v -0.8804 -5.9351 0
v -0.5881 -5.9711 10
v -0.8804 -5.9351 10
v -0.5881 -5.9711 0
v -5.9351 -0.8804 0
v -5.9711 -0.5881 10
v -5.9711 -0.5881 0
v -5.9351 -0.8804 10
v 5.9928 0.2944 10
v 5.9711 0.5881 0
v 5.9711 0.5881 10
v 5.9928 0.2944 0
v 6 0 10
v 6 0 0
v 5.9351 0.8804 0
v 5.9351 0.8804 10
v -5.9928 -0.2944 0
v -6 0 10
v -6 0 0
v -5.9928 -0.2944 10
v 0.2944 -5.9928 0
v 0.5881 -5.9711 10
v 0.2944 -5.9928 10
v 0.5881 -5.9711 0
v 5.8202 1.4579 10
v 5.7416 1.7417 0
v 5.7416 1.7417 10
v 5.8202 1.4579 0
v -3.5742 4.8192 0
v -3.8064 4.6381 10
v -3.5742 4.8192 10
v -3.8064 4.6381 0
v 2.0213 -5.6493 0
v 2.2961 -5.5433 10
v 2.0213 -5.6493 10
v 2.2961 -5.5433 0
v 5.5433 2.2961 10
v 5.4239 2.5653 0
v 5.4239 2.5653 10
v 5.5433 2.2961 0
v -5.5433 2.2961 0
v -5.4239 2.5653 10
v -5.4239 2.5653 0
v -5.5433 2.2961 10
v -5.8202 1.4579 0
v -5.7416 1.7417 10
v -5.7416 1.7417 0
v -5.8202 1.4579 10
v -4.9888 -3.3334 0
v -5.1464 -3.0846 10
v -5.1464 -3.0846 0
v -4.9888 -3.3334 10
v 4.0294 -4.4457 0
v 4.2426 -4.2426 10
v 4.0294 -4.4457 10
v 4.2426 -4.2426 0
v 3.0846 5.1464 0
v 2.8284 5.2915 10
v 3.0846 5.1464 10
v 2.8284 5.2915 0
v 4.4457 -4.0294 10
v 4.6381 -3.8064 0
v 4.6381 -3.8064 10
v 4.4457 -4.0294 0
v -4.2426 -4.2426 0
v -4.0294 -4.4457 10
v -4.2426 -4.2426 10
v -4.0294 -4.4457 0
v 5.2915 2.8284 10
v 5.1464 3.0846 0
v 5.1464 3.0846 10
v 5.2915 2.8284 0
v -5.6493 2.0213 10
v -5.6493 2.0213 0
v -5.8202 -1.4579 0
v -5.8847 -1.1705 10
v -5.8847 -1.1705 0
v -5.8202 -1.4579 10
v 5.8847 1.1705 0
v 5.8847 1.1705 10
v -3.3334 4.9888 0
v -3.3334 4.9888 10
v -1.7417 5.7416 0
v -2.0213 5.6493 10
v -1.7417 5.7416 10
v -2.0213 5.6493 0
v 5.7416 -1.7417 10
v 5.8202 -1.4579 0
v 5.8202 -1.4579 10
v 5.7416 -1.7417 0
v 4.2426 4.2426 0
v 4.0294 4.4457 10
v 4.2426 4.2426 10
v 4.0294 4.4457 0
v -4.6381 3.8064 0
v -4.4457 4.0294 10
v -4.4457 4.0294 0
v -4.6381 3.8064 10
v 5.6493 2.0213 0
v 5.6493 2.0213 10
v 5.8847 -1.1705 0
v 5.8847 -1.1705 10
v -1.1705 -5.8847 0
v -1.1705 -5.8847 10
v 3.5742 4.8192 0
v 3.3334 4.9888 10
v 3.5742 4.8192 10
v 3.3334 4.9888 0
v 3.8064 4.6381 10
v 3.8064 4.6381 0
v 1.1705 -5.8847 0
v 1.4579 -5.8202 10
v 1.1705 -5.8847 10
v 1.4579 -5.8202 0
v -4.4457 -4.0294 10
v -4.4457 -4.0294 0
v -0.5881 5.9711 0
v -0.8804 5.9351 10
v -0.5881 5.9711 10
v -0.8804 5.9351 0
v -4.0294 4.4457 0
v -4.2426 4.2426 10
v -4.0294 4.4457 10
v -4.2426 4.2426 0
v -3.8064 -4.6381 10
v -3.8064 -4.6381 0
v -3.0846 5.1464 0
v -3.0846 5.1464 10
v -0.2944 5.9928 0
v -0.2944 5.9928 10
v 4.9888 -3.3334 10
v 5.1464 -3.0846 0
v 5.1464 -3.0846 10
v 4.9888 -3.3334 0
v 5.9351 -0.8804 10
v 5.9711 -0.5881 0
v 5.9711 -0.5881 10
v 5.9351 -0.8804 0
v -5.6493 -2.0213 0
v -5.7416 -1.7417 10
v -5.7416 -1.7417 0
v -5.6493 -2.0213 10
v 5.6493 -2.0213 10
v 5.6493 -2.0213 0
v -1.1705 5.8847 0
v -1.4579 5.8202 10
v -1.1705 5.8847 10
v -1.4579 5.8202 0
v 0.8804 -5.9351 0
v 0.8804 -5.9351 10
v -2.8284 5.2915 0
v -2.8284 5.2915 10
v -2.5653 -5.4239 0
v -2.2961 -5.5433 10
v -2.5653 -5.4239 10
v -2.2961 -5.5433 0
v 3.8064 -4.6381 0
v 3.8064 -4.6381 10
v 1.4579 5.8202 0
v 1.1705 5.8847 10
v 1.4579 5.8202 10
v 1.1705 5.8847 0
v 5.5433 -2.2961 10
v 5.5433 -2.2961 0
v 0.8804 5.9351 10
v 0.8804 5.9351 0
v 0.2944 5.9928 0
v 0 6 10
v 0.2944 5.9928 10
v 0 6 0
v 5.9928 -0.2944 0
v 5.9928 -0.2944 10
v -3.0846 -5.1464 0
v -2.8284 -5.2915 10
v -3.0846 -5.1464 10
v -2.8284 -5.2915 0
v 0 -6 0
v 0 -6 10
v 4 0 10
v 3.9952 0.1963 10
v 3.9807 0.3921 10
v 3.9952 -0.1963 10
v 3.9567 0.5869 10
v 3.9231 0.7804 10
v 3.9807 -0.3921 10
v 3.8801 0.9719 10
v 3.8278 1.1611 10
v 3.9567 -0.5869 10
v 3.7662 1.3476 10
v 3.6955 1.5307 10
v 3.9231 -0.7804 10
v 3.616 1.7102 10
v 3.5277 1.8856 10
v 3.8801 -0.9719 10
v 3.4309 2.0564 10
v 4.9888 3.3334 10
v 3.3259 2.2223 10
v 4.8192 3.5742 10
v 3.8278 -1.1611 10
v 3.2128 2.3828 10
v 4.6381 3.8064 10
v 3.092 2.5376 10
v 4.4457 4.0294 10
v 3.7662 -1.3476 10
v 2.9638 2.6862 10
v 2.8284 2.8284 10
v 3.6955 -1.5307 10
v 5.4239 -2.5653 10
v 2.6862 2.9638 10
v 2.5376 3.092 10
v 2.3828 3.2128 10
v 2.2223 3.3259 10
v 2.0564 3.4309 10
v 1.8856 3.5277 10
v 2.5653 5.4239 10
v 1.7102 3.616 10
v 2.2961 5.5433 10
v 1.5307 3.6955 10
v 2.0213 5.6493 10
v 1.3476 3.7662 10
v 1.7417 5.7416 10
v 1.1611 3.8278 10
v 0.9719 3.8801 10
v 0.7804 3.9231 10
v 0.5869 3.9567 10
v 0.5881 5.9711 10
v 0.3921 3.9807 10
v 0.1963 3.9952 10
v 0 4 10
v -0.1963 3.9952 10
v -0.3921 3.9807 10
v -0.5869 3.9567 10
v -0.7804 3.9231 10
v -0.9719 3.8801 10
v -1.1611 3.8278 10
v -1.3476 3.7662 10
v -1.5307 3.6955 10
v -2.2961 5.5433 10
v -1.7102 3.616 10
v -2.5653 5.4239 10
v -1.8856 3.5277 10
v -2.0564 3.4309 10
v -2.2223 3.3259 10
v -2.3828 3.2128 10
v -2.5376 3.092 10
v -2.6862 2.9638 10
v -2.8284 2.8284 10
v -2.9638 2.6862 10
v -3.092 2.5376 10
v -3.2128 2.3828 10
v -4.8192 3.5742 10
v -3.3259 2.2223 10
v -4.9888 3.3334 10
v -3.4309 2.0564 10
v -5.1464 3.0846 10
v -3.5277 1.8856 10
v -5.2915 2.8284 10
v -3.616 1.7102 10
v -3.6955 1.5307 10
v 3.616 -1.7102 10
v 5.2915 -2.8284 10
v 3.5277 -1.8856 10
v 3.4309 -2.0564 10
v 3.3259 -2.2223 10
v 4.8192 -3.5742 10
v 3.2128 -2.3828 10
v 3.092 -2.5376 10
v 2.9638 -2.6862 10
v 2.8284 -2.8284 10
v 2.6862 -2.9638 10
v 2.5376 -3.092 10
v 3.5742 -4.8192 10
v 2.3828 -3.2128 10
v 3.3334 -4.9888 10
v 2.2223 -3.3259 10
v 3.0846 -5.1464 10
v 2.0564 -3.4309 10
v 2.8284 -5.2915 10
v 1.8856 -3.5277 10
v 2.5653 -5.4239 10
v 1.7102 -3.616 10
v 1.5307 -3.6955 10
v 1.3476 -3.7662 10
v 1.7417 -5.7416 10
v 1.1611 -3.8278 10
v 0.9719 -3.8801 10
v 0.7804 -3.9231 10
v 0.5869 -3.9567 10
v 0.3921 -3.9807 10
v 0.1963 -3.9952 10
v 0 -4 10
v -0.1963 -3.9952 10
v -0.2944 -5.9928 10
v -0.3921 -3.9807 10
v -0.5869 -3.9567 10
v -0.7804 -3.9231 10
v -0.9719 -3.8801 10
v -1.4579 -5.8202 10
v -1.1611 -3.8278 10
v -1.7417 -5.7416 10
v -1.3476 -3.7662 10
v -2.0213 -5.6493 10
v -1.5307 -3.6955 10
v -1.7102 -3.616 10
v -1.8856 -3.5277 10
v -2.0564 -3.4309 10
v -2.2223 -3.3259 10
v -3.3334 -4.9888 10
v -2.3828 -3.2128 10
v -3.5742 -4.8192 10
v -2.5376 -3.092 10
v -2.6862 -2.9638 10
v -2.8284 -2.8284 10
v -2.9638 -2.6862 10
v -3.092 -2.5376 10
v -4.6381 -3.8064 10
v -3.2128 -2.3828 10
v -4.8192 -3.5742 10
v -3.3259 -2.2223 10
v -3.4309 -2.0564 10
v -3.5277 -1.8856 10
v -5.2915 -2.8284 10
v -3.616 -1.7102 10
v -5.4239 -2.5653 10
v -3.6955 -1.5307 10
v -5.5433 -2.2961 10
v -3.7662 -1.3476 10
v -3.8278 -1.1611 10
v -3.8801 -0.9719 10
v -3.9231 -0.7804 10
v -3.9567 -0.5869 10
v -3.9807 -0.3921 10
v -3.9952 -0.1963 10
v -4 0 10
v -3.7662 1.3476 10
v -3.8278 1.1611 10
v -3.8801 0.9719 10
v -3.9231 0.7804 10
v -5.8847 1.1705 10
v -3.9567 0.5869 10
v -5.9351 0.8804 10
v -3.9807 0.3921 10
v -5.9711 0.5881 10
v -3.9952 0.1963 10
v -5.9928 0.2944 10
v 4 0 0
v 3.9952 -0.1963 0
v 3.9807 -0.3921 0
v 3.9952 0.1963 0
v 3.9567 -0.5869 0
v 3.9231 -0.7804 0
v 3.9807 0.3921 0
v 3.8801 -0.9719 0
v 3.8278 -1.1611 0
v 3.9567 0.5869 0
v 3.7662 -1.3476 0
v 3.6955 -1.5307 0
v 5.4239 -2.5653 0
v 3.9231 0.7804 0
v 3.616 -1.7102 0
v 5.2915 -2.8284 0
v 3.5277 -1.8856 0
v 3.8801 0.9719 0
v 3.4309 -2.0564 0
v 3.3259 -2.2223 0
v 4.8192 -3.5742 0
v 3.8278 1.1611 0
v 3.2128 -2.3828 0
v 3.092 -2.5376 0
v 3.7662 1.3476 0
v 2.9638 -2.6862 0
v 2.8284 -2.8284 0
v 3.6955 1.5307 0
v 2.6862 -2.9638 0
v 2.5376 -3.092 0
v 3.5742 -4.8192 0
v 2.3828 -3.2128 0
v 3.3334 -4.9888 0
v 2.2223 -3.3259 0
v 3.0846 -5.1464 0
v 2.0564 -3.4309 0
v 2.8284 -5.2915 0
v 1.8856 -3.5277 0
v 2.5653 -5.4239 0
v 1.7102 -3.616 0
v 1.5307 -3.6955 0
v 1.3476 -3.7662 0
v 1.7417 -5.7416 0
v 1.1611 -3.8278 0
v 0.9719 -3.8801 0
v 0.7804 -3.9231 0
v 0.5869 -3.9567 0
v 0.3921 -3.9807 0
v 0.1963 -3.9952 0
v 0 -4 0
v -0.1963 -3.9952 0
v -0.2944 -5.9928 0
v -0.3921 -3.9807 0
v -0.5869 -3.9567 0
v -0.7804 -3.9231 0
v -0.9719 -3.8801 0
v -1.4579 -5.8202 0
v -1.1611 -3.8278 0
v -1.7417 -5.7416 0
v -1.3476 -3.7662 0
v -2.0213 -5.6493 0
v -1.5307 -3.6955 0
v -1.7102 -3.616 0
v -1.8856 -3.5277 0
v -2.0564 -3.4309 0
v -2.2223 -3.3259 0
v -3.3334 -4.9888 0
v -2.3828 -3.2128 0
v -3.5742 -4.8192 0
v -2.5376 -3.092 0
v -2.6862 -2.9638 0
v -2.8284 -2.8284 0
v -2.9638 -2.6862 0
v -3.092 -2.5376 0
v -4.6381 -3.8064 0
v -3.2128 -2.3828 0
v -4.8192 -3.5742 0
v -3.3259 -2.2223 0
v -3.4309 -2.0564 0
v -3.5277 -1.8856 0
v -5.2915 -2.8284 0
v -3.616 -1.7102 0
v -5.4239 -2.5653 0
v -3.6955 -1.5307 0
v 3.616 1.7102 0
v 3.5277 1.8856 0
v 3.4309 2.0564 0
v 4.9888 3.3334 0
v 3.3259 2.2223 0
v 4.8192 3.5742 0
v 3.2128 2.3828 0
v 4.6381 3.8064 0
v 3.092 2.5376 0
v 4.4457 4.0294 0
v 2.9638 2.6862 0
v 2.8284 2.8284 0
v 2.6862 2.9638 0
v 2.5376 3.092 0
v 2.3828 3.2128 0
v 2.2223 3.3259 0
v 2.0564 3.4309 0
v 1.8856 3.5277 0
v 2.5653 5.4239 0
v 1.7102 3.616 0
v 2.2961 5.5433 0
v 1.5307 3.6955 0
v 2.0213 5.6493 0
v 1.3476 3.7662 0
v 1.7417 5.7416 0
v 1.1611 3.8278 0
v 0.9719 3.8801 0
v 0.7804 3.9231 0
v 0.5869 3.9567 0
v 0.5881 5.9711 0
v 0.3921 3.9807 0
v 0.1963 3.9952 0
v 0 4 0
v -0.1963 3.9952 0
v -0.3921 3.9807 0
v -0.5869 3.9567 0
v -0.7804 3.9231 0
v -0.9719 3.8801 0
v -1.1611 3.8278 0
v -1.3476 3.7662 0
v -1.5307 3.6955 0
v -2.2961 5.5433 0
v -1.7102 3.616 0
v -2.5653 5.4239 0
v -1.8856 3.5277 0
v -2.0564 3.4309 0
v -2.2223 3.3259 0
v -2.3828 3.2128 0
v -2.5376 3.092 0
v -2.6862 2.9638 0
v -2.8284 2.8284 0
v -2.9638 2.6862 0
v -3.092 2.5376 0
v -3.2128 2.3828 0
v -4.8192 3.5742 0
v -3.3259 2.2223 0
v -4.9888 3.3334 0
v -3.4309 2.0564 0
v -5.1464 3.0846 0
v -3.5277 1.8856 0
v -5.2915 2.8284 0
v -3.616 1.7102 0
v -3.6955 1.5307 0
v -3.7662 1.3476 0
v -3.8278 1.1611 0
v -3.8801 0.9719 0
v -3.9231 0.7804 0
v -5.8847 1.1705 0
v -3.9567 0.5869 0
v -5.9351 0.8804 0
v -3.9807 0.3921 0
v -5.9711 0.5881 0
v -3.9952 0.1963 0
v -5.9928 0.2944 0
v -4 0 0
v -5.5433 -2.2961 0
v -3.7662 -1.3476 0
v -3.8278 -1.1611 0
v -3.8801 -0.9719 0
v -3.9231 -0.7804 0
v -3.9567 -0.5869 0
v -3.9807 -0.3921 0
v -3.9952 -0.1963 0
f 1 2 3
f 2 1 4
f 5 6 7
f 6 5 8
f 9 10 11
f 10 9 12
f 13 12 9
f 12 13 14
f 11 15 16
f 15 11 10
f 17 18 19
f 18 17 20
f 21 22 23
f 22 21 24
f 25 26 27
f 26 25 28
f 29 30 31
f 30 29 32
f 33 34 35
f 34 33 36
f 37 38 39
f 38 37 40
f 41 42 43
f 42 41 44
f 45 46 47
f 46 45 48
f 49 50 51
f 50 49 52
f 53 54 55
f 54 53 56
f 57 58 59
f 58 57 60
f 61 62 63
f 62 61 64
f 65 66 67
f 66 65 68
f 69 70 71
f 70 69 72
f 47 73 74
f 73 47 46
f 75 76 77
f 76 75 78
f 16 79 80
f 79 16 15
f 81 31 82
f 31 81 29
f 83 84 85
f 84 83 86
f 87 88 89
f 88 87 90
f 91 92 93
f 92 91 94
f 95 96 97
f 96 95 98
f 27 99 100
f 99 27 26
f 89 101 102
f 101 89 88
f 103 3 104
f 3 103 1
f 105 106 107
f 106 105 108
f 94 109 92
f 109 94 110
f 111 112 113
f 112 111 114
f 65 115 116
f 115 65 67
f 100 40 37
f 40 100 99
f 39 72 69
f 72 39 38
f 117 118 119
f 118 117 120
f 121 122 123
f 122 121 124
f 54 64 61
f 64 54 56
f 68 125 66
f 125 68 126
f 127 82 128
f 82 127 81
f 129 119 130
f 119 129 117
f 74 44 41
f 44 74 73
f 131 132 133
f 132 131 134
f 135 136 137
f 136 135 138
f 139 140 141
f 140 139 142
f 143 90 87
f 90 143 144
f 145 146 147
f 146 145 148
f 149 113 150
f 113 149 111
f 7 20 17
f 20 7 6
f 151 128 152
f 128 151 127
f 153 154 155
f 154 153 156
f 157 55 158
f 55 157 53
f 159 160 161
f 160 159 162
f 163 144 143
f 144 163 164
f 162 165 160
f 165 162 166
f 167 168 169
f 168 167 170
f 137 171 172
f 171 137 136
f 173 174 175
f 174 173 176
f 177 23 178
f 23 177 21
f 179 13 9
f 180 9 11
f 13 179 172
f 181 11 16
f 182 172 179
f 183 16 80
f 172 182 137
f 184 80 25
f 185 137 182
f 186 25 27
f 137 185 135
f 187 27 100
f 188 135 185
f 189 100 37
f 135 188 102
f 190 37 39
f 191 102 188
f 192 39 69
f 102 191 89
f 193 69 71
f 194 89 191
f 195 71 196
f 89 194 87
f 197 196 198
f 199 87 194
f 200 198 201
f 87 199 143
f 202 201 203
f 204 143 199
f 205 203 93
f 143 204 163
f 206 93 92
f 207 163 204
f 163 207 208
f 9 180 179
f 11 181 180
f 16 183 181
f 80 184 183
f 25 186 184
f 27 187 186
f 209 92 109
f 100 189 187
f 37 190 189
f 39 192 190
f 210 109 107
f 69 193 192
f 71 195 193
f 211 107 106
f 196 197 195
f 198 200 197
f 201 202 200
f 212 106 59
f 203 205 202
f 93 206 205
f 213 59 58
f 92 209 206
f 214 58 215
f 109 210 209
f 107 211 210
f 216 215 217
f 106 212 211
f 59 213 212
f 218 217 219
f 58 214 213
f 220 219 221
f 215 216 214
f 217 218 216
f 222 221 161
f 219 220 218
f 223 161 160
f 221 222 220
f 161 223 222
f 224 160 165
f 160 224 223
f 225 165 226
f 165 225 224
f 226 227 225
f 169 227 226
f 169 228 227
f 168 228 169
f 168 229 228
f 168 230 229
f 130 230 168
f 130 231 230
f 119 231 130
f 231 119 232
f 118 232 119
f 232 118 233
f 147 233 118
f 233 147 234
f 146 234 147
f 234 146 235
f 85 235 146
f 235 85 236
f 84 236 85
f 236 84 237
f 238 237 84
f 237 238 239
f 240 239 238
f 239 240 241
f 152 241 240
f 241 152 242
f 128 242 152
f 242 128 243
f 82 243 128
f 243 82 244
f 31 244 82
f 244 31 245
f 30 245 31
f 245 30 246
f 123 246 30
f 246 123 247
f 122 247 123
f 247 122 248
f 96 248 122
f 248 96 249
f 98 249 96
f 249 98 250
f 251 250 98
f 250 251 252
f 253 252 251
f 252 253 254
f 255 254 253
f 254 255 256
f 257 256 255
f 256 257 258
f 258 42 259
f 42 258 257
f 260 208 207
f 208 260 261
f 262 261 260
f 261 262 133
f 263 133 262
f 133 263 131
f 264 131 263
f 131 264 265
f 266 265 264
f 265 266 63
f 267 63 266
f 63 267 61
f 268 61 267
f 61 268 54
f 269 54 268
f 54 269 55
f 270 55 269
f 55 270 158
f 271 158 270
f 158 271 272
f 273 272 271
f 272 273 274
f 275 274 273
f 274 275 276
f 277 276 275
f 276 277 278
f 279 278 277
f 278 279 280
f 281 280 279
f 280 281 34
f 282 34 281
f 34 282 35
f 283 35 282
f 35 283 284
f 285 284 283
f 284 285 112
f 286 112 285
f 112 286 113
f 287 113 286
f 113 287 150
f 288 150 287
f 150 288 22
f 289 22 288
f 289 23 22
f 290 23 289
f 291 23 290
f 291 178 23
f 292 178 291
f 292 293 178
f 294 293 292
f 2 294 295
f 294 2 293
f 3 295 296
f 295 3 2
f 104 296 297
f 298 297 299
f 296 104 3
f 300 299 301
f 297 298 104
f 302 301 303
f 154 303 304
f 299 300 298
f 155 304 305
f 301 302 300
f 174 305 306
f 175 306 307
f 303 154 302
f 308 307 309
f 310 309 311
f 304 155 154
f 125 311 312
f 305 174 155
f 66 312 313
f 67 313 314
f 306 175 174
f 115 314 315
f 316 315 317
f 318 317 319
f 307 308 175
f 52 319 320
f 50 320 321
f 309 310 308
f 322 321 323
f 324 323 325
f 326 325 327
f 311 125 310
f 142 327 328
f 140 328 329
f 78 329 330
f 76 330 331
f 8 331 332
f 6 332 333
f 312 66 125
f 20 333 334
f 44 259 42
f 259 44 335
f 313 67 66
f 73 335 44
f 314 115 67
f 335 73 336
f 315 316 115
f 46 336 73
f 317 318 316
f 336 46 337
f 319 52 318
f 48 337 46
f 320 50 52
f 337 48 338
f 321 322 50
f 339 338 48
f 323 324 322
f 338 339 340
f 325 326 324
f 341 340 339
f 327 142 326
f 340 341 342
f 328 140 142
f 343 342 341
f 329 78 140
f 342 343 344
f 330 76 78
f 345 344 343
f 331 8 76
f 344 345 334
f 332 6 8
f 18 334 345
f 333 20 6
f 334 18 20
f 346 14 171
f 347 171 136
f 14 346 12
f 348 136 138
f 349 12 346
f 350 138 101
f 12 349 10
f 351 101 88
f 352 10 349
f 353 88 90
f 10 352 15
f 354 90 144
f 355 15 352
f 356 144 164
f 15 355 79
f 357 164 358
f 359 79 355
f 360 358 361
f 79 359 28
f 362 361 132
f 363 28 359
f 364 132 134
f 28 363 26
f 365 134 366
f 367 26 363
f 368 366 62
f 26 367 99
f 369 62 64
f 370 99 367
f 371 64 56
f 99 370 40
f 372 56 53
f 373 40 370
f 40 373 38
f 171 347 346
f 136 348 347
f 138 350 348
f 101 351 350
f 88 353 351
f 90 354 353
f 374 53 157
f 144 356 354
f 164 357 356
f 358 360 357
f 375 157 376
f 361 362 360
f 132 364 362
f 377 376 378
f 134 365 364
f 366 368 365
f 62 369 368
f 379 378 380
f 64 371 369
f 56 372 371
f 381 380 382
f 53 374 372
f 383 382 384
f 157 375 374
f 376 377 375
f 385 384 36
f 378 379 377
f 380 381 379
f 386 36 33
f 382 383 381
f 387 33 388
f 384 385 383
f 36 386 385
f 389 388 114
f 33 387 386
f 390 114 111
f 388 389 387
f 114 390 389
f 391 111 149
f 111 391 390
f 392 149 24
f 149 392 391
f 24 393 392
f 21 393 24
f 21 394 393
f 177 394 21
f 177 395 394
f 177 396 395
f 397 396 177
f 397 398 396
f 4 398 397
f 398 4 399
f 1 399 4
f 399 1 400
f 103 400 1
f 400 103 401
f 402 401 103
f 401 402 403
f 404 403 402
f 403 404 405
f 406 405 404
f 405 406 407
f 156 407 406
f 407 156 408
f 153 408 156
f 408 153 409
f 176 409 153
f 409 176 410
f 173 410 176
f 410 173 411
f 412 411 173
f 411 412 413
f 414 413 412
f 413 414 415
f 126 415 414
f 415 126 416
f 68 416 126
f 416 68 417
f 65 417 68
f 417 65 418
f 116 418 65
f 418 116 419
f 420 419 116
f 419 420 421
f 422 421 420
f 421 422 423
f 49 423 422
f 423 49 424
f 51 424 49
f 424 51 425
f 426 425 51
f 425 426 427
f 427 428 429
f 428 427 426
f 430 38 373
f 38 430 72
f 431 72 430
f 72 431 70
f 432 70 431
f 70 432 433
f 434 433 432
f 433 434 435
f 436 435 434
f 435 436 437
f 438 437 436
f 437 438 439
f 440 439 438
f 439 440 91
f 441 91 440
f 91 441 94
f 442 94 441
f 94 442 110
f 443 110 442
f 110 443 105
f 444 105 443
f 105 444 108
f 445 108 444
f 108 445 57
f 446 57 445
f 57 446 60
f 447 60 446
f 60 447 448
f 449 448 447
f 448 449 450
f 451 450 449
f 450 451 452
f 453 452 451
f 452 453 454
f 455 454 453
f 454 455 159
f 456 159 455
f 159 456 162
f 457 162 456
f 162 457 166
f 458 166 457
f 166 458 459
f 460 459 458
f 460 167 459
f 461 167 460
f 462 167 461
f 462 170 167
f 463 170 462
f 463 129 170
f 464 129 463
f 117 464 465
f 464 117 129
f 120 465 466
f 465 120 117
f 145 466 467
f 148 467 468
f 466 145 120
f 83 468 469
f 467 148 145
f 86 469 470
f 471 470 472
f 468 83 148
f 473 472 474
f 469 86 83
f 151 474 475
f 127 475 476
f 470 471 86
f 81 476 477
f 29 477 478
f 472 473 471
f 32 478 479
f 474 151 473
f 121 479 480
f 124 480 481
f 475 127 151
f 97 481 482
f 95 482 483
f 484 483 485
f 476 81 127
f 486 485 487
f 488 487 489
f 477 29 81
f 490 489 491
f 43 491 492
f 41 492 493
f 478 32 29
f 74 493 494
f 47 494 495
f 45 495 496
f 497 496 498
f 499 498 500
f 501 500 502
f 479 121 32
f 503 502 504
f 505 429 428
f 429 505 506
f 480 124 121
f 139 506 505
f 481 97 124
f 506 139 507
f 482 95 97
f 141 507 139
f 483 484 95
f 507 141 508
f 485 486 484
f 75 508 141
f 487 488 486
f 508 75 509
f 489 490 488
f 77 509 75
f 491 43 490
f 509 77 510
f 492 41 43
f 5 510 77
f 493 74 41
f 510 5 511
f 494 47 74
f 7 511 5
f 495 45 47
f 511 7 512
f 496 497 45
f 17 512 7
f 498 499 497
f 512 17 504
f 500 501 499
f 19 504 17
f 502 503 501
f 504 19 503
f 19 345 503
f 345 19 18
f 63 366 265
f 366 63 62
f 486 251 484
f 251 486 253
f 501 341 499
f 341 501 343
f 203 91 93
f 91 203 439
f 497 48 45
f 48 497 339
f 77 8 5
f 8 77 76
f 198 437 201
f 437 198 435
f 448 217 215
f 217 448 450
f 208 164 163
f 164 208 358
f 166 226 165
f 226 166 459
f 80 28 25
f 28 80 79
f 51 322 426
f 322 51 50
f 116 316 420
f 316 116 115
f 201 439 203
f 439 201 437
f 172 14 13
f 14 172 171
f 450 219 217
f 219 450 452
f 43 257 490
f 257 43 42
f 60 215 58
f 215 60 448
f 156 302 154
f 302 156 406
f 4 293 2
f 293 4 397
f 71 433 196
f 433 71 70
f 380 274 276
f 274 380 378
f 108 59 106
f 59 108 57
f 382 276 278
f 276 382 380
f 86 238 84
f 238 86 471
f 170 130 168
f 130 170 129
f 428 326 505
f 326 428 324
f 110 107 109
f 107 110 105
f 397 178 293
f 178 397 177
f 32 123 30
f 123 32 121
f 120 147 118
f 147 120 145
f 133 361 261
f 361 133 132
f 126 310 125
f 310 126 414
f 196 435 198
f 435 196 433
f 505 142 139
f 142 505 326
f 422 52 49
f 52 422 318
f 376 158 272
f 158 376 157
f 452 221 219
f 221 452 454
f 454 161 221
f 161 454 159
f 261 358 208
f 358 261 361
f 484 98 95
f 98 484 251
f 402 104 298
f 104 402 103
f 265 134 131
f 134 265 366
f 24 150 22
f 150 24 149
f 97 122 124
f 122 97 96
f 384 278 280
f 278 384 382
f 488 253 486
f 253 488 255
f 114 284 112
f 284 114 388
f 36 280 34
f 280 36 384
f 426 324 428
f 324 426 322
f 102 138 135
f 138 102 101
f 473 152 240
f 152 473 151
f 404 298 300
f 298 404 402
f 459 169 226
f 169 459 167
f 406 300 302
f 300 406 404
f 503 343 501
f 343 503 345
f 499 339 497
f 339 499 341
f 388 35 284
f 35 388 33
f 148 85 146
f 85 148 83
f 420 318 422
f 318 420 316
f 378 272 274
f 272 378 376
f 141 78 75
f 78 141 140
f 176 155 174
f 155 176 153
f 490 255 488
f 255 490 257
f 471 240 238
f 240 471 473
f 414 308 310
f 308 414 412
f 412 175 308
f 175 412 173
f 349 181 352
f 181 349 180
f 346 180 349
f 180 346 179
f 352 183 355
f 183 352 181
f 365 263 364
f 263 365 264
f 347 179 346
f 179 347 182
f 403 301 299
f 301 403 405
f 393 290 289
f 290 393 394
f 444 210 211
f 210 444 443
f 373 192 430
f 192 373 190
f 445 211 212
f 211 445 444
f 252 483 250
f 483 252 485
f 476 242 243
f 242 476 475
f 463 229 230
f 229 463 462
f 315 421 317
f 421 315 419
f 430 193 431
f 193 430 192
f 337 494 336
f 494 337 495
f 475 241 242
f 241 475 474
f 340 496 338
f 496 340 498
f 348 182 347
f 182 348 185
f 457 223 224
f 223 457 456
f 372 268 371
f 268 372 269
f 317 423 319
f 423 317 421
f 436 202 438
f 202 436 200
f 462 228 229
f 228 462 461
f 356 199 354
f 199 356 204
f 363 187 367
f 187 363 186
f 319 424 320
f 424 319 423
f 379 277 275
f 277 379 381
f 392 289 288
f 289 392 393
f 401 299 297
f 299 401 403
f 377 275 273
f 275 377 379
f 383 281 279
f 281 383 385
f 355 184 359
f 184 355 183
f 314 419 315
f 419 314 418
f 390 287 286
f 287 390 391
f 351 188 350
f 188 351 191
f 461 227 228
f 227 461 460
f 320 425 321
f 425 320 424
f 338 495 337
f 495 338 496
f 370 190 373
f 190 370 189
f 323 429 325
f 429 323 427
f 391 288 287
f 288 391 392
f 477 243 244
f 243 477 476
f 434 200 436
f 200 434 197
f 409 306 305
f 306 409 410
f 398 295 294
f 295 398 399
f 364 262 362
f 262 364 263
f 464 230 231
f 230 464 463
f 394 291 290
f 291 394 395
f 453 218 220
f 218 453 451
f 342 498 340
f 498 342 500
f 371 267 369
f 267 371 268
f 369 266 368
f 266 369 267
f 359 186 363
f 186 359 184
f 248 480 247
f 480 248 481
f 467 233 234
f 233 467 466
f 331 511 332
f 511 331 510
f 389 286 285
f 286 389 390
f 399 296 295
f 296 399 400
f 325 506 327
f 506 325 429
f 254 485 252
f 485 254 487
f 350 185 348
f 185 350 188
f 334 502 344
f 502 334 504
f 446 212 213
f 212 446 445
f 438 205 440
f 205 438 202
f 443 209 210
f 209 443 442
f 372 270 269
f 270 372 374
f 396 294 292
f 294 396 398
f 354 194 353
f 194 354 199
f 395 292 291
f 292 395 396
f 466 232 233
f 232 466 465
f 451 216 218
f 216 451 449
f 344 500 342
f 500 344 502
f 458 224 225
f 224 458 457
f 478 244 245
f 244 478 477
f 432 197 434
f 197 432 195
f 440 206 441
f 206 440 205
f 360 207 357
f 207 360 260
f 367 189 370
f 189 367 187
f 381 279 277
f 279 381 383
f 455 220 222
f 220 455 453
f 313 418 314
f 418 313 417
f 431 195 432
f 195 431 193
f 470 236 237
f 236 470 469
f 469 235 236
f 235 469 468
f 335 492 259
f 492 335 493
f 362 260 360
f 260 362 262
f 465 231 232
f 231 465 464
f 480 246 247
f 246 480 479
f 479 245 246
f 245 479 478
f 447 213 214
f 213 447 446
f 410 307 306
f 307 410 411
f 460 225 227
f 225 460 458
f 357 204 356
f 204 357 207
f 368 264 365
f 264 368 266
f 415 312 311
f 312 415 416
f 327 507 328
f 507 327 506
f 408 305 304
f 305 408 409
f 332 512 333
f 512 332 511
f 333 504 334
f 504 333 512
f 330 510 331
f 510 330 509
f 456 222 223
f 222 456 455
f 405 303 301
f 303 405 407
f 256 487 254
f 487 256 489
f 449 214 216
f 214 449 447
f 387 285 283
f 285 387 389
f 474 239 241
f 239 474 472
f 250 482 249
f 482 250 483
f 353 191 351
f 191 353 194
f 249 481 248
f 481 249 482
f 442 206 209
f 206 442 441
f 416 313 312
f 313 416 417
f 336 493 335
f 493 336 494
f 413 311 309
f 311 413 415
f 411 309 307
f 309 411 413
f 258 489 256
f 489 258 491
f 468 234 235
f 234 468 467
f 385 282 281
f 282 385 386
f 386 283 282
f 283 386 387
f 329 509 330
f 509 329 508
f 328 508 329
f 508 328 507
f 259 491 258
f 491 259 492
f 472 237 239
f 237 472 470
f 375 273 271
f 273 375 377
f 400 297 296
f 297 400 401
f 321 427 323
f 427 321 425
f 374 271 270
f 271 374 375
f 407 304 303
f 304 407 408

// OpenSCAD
// Illustrative design, millimetres. Not a machine toolpath or qualified build file.
$fn = 128;
difference() {
  cylinder(h = 10, d = 12);
  translate([0, 0, -0.01]) cylinder(h = 10.02, d = 8);
}
